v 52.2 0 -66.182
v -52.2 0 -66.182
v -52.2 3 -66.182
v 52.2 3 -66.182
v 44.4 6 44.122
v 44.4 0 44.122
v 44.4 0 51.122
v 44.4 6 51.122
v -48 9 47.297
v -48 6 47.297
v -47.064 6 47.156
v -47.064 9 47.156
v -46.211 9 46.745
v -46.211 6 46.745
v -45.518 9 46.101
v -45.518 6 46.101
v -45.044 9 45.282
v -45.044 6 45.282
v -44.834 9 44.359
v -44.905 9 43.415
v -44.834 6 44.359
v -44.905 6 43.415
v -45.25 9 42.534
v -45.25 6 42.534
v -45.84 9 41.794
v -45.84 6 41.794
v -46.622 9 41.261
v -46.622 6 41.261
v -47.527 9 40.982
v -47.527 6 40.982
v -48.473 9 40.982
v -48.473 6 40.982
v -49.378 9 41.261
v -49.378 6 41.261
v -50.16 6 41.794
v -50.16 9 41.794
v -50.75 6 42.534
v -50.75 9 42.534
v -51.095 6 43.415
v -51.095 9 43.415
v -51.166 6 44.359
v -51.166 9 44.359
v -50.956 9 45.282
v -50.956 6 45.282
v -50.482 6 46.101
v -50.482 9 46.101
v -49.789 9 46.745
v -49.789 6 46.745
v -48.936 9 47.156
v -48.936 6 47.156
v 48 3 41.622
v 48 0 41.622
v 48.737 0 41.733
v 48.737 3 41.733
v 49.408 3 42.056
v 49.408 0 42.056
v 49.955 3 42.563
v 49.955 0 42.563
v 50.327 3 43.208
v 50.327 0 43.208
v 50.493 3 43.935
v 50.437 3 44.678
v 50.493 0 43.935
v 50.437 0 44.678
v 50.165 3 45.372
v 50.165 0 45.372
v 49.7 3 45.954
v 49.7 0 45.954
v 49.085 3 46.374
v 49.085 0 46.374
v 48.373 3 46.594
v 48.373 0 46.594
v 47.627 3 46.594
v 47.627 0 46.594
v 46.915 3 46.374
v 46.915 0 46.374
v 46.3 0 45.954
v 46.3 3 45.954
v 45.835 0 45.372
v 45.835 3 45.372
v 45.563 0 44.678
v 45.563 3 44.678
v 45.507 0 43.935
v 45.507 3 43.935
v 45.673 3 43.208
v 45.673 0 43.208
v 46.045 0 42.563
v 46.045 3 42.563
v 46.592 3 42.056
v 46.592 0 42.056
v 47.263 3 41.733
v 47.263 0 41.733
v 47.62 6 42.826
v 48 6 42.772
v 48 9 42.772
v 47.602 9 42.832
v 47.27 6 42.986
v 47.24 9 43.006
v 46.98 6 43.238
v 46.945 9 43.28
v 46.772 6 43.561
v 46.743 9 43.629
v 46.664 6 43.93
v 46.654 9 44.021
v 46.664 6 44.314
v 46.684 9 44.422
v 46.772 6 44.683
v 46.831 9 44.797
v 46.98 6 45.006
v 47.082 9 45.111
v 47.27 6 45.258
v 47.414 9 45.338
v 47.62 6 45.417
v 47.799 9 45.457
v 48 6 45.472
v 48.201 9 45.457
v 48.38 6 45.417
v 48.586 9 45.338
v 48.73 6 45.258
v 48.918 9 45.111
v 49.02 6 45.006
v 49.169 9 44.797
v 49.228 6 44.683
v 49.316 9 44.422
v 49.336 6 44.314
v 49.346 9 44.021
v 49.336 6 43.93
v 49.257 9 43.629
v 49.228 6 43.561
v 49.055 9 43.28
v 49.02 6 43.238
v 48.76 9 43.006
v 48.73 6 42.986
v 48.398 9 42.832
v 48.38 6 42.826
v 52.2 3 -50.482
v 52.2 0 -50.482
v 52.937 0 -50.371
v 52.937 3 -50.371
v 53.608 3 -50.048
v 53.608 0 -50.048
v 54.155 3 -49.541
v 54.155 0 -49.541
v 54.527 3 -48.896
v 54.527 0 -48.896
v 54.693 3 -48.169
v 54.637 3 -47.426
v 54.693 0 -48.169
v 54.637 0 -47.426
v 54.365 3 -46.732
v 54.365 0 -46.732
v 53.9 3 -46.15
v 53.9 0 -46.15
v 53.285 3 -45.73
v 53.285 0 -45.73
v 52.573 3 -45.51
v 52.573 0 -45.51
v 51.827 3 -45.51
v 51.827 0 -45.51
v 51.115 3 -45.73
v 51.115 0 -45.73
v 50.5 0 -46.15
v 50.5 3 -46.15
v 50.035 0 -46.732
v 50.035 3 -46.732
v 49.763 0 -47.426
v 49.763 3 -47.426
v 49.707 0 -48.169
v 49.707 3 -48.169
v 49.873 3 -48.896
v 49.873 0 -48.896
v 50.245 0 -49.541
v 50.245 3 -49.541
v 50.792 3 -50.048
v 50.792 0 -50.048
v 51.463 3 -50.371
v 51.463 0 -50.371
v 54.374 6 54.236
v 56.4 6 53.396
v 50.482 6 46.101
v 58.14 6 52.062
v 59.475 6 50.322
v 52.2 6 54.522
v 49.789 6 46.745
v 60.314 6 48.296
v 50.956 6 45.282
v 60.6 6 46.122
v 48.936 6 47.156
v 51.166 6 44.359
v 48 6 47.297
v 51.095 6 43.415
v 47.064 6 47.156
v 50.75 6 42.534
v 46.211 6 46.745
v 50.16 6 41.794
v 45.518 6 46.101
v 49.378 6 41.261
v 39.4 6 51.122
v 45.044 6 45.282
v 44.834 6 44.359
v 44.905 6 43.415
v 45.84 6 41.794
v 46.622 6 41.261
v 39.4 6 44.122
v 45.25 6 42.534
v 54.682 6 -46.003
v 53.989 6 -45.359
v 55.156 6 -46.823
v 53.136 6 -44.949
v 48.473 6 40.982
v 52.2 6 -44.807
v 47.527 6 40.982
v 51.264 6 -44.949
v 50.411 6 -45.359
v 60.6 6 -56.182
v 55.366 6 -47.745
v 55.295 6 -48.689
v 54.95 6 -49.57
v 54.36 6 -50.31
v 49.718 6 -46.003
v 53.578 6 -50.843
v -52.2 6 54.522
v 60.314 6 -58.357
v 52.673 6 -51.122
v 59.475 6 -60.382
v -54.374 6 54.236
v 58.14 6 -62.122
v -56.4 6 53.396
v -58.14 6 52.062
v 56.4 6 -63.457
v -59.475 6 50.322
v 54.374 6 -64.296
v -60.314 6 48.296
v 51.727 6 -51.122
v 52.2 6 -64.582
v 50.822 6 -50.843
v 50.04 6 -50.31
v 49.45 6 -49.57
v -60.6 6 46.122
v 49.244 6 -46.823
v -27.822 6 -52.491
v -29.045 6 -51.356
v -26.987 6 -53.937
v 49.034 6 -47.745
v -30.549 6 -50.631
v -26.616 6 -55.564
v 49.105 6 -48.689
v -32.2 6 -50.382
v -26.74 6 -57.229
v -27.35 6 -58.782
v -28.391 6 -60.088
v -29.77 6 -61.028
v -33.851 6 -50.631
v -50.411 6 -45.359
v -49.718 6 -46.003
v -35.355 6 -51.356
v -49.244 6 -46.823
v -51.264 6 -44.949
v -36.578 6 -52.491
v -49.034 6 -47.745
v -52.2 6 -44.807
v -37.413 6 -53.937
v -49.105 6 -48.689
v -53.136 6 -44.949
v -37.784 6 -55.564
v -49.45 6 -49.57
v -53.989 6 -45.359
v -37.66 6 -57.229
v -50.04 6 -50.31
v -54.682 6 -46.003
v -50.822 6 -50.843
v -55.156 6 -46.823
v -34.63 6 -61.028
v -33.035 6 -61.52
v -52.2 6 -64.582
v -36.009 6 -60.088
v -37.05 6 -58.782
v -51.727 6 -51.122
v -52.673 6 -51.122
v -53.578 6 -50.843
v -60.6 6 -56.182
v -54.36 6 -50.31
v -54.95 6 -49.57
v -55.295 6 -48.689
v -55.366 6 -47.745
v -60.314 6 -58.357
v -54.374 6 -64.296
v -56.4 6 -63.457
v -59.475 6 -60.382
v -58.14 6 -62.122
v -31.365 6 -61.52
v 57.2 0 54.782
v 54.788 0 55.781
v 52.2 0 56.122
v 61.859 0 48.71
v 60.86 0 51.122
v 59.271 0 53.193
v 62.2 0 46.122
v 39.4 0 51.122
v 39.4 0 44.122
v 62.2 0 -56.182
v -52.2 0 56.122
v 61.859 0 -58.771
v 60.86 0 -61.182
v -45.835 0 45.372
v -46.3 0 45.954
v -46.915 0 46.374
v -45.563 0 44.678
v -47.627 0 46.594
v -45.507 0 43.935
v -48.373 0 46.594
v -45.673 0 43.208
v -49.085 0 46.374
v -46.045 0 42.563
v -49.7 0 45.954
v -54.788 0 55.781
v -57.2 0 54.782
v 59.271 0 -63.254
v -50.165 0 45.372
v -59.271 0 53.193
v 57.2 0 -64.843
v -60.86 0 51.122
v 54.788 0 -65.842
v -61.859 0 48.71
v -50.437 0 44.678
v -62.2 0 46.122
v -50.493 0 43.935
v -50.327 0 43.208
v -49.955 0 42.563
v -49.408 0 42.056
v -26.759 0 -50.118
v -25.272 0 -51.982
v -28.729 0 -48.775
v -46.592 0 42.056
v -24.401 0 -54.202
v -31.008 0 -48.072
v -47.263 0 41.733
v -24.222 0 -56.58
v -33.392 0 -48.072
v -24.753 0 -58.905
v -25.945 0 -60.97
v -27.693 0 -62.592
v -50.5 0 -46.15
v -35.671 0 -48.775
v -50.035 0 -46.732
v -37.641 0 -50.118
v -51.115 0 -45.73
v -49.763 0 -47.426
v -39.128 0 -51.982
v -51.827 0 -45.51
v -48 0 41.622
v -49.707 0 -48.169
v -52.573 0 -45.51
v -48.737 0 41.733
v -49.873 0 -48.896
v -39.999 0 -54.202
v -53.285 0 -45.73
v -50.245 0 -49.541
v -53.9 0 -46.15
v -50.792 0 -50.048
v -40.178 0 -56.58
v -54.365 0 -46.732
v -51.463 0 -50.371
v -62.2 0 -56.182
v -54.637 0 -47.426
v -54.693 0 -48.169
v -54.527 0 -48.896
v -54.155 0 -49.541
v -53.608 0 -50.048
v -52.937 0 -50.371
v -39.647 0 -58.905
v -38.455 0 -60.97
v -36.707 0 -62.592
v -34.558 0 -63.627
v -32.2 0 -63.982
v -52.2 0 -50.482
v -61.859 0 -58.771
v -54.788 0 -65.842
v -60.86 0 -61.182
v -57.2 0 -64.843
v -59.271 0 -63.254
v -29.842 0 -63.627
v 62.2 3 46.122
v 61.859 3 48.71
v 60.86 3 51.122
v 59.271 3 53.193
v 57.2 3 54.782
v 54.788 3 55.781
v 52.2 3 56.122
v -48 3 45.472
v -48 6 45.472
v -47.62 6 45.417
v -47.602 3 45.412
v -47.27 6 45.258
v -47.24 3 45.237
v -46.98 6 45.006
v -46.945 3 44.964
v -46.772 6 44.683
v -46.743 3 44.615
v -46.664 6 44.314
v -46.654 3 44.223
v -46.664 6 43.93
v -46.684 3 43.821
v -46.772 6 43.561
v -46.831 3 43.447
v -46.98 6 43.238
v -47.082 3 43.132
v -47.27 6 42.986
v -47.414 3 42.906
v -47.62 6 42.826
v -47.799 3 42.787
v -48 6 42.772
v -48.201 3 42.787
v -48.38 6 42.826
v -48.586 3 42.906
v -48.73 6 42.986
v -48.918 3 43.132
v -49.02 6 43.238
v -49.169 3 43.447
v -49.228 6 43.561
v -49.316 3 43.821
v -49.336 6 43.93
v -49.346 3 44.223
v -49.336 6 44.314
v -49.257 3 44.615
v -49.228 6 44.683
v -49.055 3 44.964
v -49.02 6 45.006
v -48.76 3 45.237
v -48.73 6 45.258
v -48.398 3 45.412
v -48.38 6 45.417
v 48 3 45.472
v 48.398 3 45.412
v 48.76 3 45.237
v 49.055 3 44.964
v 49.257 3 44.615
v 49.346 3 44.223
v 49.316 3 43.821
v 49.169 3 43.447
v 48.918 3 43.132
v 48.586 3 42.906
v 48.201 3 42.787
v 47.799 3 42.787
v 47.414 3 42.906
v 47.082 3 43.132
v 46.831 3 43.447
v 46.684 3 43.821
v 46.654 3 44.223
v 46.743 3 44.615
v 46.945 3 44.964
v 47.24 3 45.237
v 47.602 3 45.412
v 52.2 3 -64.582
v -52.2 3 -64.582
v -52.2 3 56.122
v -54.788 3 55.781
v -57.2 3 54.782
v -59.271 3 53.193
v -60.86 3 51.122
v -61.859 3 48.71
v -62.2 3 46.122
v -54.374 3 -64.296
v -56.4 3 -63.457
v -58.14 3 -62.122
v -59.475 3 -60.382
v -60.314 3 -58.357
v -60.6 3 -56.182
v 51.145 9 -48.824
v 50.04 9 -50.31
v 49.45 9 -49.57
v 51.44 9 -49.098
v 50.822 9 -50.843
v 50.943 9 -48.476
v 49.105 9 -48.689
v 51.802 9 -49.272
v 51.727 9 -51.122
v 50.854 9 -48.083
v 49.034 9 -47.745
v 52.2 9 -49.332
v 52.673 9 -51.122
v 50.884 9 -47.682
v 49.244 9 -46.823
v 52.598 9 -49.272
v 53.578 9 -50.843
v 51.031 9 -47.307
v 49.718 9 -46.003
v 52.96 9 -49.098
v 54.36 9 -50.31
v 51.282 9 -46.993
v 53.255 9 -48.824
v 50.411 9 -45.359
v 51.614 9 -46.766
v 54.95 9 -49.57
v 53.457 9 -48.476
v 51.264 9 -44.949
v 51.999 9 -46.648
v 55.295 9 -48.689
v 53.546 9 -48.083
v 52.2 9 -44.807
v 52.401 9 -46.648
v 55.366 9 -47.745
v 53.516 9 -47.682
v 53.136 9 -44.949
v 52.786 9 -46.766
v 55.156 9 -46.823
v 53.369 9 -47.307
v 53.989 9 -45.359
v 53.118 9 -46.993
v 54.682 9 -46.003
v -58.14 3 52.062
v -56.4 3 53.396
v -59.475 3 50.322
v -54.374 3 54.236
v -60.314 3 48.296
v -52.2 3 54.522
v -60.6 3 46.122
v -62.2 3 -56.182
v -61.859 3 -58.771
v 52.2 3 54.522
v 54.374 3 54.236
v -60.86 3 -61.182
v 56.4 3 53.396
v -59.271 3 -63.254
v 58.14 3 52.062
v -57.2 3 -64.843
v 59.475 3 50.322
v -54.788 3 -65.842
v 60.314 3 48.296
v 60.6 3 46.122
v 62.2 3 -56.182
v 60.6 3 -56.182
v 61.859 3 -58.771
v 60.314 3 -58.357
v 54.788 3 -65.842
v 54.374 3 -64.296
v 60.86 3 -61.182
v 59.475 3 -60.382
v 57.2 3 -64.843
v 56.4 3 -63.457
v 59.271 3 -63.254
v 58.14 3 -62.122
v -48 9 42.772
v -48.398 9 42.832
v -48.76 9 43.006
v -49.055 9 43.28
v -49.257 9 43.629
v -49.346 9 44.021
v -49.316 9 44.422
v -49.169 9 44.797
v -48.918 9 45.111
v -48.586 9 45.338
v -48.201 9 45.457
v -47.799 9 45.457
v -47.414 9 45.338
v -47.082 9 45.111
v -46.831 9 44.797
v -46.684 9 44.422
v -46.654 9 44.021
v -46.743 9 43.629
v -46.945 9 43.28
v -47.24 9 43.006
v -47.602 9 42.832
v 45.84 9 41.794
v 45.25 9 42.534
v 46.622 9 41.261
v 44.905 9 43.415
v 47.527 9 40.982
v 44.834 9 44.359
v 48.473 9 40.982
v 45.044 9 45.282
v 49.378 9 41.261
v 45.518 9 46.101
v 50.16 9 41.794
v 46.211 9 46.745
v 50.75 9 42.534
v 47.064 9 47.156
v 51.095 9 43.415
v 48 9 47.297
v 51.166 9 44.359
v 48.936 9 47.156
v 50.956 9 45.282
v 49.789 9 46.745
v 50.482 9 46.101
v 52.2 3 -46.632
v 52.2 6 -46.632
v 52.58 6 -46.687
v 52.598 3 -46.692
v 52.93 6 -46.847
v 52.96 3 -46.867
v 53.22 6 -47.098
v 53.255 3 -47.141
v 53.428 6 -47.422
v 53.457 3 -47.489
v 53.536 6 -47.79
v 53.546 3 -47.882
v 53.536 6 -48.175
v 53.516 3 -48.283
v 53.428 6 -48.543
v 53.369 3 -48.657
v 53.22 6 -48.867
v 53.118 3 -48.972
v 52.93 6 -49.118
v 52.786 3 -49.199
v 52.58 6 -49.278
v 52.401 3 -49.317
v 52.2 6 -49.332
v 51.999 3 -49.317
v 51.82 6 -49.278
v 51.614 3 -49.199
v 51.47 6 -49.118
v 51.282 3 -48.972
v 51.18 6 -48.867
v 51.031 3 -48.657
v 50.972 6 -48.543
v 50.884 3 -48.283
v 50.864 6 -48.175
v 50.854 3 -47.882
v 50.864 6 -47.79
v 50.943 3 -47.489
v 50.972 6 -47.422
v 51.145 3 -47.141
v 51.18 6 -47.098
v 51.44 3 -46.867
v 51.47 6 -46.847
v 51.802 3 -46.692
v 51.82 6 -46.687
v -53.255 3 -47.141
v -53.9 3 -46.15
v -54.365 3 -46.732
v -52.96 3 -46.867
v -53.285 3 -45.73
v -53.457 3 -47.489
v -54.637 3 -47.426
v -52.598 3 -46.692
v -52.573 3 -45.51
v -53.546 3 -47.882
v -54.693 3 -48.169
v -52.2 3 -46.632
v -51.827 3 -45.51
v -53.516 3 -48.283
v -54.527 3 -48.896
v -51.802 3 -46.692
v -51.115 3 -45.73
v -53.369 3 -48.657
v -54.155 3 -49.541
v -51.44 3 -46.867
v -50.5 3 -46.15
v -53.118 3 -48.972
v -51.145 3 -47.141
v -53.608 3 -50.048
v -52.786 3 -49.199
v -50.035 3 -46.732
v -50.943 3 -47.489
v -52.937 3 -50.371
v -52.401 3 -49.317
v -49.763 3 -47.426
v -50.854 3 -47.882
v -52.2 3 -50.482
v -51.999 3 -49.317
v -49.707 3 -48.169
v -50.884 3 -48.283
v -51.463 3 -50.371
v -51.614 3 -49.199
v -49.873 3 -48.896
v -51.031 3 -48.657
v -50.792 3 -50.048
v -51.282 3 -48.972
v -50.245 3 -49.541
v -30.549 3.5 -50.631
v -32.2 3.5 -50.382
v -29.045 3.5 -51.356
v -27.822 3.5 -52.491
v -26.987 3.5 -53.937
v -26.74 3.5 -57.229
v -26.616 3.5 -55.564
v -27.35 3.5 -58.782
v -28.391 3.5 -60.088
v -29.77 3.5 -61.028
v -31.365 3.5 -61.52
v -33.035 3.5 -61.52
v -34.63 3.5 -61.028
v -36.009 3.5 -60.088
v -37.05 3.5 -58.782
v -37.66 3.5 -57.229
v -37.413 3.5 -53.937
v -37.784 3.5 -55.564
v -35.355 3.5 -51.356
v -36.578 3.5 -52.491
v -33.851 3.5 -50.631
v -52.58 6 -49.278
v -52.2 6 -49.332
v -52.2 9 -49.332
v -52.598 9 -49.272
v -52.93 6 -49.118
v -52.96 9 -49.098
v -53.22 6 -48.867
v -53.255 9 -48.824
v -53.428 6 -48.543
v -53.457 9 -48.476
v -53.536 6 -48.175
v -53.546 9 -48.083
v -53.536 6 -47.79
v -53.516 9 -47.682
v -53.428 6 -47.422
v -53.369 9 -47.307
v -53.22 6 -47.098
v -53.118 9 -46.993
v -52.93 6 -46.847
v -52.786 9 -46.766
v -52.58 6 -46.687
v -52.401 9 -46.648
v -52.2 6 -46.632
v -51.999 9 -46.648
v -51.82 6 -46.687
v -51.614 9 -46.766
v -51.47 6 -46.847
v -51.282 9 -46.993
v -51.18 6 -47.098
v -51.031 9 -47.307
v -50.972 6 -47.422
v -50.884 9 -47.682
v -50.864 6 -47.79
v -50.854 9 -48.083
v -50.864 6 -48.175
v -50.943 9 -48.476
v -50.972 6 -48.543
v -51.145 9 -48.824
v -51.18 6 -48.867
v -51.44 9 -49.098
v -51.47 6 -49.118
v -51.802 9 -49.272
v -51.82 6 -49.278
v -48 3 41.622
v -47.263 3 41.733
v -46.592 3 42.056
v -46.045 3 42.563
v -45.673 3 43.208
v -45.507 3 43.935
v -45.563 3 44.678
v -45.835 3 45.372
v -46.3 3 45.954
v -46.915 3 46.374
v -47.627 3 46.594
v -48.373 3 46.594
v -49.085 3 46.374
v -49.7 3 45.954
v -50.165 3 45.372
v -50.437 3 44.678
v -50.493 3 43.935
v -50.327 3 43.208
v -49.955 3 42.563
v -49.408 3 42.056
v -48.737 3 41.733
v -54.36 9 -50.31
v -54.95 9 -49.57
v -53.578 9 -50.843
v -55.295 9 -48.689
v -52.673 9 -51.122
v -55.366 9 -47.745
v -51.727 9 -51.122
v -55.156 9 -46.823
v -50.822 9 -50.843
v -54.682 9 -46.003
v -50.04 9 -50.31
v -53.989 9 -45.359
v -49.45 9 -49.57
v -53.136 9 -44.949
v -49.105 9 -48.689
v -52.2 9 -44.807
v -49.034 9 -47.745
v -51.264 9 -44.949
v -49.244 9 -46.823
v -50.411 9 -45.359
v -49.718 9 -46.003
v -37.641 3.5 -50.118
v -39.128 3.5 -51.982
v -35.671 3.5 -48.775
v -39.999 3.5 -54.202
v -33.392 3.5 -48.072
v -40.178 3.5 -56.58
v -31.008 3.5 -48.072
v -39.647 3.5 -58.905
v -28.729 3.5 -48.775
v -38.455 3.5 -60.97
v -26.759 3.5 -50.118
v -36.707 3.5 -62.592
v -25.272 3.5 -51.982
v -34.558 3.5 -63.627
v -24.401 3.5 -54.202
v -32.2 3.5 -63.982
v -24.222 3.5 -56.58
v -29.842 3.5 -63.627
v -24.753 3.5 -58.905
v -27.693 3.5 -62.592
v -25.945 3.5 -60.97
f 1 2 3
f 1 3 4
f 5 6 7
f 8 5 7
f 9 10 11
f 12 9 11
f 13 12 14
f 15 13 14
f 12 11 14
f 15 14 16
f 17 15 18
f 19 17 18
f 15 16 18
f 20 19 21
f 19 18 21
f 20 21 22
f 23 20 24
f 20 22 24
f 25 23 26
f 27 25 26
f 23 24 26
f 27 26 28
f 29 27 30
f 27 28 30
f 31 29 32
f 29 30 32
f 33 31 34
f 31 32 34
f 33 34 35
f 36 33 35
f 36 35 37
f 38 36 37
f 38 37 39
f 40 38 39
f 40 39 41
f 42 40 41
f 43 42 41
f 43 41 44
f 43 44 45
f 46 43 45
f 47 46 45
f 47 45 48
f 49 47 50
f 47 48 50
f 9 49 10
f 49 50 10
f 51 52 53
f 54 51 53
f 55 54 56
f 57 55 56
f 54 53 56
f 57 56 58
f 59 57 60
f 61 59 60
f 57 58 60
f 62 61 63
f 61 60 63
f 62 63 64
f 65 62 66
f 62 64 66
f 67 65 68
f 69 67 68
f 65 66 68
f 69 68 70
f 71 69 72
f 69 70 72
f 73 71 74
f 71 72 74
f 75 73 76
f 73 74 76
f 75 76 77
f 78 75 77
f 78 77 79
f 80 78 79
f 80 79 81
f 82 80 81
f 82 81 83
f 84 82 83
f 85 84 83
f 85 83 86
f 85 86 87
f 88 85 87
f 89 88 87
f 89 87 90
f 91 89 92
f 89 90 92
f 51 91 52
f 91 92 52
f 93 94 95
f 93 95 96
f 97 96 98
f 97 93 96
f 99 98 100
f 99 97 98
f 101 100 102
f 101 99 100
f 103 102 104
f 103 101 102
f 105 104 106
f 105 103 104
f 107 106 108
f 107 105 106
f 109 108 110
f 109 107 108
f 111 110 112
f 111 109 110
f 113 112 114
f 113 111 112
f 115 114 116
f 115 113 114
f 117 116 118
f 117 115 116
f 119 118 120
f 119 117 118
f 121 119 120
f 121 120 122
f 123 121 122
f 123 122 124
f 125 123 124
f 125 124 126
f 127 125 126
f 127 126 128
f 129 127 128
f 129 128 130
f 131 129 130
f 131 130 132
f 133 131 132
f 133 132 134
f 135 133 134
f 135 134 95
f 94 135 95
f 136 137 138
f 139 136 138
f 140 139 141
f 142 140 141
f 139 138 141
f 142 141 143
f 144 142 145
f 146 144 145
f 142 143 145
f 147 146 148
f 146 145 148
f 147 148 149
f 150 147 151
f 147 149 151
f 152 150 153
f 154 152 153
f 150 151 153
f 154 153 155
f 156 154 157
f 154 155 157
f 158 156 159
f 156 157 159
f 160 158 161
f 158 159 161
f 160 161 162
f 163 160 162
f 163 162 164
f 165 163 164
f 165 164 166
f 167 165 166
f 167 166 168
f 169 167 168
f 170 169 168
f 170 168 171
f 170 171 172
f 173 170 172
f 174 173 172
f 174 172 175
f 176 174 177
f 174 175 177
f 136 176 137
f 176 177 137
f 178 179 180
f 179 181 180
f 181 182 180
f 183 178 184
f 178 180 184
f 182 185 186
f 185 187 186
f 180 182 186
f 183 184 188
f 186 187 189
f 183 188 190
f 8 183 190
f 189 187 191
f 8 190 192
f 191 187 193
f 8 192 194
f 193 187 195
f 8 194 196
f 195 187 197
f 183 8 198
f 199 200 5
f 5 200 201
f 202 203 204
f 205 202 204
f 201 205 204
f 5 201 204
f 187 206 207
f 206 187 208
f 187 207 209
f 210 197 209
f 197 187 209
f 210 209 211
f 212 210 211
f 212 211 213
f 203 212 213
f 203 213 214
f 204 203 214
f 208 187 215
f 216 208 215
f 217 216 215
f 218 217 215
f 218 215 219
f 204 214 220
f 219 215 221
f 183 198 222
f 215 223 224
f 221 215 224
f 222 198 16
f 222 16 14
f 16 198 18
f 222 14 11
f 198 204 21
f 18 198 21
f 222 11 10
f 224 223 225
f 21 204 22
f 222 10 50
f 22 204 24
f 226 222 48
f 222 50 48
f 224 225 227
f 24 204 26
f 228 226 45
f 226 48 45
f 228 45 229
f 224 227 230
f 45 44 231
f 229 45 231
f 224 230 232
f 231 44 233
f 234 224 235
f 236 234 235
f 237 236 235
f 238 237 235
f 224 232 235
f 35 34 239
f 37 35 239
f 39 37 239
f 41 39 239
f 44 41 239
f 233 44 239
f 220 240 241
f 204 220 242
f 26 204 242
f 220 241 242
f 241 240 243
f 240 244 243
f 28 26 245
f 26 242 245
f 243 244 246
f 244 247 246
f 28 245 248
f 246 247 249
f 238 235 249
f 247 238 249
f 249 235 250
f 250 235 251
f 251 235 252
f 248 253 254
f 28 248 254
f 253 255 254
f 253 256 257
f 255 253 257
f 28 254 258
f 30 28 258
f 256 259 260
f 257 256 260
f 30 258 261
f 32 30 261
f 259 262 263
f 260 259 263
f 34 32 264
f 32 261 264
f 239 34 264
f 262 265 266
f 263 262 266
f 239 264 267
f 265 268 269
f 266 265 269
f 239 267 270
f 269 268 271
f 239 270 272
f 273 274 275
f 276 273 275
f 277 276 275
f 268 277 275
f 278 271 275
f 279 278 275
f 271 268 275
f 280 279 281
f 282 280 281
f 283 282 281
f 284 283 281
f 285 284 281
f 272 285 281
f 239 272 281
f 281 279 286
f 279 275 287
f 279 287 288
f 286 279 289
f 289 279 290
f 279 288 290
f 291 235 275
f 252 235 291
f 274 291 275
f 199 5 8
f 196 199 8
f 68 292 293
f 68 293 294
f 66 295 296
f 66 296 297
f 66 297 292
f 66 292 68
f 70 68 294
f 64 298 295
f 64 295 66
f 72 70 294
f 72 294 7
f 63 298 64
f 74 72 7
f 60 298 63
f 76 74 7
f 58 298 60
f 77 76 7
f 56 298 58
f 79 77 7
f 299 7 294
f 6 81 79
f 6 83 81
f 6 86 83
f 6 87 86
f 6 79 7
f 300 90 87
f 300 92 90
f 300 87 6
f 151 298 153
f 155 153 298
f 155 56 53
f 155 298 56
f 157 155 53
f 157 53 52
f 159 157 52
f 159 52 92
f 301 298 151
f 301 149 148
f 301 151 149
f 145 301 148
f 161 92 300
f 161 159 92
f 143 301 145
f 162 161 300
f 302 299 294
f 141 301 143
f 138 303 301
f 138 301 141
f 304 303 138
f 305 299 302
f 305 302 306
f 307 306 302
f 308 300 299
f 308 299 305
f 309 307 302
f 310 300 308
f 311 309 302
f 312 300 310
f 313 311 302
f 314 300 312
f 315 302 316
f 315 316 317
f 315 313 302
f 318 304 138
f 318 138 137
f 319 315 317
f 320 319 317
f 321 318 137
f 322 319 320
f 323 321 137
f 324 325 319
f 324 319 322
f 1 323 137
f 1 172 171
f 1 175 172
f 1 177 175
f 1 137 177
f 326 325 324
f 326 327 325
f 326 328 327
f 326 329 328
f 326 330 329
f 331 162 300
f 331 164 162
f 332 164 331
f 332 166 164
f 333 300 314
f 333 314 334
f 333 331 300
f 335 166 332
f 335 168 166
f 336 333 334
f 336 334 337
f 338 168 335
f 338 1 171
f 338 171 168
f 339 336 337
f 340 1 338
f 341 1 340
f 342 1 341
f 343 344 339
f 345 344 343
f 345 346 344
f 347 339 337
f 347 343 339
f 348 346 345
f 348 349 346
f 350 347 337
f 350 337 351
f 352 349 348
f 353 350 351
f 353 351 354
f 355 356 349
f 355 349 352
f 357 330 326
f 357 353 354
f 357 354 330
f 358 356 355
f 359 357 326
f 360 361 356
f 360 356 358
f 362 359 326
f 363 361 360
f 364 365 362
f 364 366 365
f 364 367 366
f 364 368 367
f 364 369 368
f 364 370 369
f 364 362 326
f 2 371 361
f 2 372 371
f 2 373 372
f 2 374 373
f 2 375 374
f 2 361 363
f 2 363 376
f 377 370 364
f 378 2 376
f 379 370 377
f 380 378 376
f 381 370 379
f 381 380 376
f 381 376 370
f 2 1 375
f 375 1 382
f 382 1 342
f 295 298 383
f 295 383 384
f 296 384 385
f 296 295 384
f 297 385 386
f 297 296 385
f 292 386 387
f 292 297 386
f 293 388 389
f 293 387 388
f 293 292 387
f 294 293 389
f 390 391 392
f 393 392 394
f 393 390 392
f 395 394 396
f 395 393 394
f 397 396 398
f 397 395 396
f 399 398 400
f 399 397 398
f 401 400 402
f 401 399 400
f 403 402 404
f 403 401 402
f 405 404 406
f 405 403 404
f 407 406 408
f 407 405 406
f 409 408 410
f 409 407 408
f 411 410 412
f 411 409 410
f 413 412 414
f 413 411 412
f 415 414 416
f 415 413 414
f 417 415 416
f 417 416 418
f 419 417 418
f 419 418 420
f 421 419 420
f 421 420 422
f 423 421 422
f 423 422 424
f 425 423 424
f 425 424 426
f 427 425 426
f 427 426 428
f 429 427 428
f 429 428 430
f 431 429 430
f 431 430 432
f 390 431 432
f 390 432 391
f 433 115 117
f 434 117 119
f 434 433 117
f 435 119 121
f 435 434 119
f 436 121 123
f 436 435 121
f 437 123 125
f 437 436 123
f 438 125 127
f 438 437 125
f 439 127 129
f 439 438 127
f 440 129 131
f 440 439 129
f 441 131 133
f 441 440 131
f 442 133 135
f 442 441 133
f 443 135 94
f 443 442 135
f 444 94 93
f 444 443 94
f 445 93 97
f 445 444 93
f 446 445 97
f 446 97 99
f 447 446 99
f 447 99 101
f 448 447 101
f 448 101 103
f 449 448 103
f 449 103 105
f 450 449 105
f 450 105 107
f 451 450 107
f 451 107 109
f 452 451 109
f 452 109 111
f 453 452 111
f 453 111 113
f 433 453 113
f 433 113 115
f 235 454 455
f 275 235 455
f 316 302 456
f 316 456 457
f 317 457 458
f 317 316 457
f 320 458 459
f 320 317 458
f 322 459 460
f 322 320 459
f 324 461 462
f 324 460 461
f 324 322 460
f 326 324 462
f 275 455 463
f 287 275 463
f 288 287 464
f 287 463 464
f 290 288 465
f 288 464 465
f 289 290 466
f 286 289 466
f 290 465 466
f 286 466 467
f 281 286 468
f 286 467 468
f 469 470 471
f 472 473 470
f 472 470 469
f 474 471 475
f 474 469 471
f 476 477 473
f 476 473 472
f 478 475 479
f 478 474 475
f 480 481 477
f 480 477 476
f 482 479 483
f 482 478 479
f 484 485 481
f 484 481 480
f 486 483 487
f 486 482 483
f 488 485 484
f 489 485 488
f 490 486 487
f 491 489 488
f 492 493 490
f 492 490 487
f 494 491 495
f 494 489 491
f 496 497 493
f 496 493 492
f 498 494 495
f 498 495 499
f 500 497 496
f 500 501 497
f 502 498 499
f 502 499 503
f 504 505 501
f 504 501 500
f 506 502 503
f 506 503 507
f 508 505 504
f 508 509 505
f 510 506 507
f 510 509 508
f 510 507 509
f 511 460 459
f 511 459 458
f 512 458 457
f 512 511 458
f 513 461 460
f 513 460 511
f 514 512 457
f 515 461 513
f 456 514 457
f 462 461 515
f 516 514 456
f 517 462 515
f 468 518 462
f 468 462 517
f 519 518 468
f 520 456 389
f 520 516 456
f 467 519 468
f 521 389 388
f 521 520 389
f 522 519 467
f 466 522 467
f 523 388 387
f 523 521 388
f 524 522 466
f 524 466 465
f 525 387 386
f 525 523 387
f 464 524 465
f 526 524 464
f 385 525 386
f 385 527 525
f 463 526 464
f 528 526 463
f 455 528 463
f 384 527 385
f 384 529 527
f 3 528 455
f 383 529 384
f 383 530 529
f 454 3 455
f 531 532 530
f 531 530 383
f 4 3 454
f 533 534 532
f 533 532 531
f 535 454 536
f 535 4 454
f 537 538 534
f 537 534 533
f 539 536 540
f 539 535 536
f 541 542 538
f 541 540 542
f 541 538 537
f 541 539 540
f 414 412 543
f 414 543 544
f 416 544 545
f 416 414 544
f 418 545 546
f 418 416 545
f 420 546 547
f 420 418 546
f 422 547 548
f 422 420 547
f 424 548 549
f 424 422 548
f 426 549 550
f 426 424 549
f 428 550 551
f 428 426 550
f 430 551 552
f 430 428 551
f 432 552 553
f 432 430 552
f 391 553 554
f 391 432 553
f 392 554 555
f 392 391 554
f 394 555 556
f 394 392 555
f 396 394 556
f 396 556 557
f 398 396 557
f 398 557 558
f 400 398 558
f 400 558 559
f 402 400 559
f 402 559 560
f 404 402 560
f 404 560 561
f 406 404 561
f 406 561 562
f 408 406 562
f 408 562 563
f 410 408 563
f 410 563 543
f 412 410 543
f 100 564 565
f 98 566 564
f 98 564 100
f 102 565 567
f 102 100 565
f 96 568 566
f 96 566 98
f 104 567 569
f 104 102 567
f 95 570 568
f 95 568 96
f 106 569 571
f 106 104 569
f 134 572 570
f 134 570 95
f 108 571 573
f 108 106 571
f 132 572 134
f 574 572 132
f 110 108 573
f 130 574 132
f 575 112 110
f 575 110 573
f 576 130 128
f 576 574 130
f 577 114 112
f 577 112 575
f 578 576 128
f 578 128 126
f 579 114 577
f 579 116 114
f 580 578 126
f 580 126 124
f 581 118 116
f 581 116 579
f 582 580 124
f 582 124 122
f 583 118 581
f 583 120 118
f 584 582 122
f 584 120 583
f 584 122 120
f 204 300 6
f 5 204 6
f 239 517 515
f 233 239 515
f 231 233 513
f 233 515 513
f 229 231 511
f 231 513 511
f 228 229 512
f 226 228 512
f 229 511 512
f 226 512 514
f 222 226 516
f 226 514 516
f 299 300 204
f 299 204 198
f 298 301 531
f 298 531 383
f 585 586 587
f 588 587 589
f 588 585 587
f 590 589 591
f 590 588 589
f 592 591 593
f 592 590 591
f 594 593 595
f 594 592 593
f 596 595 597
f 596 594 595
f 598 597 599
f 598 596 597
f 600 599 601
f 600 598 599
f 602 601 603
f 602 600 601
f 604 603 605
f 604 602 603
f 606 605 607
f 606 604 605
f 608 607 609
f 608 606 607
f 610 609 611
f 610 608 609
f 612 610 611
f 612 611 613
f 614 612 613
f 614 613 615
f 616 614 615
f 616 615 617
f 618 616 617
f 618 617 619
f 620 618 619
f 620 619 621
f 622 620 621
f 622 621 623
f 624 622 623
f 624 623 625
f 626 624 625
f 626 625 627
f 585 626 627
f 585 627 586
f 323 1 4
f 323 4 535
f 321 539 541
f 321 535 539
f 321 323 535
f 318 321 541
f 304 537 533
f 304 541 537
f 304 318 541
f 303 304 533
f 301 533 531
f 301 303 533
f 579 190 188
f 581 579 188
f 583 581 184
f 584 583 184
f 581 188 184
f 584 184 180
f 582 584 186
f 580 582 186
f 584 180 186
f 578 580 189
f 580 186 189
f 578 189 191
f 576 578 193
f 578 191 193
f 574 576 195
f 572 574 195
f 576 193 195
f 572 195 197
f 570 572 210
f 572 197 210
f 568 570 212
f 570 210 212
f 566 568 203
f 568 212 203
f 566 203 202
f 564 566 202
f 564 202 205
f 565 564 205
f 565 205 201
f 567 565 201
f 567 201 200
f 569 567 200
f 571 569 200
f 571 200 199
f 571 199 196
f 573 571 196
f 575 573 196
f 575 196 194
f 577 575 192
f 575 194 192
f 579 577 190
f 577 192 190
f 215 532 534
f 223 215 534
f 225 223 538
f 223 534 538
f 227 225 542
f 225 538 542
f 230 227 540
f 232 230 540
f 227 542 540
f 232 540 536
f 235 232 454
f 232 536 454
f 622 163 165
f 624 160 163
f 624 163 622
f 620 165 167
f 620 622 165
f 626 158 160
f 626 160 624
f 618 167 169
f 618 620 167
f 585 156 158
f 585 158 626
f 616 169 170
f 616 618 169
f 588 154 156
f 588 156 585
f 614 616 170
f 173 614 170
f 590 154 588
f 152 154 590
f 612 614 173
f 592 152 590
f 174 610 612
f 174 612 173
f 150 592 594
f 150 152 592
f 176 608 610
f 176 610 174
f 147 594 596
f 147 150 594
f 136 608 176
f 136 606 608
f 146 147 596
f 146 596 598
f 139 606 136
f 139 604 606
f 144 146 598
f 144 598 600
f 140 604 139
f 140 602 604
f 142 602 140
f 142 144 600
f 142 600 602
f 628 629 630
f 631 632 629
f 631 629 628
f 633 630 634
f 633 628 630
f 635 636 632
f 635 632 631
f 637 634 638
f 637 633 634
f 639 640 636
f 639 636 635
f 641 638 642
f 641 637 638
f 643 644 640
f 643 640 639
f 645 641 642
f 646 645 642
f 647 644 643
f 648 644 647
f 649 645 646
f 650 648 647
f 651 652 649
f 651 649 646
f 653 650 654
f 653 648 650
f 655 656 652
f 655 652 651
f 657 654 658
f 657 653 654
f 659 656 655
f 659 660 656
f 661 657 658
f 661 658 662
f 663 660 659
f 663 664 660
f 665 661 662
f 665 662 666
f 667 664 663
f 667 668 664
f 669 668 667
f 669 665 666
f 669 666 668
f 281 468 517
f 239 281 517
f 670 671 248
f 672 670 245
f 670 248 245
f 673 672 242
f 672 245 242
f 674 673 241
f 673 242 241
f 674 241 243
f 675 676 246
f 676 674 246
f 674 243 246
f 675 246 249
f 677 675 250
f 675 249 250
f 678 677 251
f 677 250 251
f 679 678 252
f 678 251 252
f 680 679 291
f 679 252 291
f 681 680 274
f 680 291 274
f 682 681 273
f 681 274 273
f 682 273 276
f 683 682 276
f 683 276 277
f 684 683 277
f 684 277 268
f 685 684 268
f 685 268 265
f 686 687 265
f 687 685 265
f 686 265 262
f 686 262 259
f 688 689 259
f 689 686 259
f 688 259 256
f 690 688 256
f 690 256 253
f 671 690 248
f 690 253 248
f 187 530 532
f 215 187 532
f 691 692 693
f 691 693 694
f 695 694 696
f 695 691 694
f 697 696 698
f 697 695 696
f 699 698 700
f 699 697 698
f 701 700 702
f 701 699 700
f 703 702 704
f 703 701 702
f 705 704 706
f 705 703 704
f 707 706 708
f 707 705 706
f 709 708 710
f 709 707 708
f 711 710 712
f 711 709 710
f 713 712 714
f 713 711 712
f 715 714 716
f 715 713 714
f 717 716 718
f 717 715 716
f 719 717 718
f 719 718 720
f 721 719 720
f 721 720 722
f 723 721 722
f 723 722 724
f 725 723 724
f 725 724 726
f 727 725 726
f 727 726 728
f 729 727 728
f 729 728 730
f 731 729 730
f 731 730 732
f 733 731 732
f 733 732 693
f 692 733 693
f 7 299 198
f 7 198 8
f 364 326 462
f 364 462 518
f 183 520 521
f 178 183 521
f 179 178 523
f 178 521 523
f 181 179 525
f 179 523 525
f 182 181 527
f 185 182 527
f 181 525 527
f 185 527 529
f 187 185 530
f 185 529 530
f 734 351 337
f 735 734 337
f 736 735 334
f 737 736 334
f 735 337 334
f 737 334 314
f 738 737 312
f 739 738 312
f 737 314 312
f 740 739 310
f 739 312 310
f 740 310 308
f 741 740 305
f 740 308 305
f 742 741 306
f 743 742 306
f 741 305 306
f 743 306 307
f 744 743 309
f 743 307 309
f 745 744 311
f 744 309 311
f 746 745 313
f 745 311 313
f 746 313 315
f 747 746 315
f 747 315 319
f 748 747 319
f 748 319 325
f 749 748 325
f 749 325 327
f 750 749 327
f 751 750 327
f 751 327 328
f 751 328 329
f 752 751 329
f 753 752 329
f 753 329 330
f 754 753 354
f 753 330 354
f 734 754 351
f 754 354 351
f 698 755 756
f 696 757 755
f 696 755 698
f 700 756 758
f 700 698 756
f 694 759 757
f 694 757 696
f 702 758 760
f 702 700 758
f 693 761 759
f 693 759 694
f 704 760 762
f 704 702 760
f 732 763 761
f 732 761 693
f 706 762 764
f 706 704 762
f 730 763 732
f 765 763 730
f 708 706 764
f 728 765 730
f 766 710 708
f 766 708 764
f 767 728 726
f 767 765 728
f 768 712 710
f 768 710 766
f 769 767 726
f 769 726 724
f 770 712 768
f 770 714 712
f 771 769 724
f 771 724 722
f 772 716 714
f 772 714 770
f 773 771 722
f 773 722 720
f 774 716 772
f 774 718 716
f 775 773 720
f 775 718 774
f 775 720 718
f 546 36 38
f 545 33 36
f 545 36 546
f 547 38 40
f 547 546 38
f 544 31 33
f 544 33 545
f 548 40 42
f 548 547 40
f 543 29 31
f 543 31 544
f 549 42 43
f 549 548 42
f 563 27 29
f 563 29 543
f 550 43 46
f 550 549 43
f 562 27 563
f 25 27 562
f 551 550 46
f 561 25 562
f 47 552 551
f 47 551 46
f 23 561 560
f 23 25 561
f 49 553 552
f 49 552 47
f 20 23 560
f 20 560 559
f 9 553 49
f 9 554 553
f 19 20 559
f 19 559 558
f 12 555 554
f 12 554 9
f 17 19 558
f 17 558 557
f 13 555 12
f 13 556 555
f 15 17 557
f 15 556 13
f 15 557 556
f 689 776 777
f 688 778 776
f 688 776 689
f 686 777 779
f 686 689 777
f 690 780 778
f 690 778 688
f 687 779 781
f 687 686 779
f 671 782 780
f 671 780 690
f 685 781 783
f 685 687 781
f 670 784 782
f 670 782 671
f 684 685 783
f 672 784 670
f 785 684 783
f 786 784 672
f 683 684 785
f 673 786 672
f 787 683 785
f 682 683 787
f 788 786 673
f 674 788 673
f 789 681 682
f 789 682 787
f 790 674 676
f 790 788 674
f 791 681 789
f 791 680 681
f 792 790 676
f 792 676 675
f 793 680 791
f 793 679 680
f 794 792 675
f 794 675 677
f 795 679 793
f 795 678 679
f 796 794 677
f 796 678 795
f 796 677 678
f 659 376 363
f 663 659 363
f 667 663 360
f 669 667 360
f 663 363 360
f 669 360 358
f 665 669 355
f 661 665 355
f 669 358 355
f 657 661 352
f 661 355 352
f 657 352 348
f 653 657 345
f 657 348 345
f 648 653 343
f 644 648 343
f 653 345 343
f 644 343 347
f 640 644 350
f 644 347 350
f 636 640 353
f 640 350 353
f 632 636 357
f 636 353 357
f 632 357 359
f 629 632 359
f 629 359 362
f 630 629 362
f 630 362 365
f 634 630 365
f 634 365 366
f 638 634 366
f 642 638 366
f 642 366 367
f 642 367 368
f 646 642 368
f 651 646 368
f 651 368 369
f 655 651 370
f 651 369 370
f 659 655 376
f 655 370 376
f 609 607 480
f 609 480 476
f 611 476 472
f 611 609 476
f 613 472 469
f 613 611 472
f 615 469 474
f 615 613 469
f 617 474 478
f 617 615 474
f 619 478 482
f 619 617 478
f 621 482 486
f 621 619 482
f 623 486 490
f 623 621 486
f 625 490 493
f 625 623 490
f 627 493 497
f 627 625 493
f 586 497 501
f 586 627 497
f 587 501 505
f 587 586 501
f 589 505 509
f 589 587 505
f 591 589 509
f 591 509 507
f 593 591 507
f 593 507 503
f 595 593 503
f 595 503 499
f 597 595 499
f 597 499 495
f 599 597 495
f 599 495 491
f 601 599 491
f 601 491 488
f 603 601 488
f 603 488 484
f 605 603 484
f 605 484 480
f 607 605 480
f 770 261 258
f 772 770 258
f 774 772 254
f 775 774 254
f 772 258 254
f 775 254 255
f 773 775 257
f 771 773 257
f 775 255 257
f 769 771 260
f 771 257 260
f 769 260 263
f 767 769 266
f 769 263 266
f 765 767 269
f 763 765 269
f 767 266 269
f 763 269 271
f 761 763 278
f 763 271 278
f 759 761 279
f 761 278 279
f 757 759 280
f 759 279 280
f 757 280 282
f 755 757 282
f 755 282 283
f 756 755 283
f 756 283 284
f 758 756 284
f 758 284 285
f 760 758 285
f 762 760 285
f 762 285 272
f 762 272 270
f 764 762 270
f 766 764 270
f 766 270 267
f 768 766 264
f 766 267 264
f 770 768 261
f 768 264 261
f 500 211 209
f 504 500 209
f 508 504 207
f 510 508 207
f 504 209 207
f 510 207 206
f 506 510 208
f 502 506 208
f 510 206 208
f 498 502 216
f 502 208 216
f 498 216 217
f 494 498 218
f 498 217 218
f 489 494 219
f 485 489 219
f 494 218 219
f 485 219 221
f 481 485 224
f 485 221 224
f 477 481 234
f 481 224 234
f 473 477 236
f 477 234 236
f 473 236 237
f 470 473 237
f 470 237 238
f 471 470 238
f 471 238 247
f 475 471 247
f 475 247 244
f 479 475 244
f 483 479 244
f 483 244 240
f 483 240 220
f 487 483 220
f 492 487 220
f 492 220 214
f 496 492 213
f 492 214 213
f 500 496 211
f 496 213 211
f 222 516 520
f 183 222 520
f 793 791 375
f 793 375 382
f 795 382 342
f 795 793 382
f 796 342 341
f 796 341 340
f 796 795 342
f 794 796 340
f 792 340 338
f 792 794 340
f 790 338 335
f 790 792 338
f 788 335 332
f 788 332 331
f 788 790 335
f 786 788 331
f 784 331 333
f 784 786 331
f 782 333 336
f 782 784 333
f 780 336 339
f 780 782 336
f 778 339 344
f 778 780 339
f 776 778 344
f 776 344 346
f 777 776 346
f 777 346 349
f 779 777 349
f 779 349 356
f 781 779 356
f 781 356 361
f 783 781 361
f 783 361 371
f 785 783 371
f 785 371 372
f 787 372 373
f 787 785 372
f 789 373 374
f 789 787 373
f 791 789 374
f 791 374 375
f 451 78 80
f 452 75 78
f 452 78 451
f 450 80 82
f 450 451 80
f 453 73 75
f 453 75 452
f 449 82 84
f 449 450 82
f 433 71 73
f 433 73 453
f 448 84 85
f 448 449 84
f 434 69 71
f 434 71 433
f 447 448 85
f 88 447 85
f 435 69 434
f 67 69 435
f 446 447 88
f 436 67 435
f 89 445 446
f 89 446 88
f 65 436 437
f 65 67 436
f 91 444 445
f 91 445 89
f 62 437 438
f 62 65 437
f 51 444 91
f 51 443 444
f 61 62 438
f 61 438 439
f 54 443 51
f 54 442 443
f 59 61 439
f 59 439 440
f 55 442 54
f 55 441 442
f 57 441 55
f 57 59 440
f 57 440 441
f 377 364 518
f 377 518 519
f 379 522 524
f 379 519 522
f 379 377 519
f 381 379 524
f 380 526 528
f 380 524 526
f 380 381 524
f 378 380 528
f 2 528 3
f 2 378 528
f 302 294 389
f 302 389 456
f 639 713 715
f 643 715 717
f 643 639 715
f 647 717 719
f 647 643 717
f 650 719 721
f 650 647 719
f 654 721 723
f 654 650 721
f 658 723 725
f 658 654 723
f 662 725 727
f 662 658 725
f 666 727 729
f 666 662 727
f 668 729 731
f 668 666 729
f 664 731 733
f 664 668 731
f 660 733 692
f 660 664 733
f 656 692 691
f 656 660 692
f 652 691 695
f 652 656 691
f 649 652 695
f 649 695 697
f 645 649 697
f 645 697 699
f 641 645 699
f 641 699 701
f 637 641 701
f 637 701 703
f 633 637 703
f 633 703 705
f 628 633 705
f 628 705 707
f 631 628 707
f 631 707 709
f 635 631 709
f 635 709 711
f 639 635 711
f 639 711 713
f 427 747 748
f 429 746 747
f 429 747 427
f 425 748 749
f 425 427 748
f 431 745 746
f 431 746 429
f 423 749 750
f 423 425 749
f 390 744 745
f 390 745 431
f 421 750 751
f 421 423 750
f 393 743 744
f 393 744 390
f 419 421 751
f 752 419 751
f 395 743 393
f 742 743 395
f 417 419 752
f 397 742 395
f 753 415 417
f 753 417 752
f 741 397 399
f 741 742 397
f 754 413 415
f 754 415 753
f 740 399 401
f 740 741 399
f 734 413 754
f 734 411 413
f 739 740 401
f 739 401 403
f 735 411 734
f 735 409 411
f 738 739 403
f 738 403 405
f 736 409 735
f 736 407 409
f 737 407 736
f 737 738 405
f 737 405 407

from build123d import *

# Parameters (mm, degrees)
SKETCH1_R           = 1.35
BOSS_EXTRUDE1_DEPTH = 6
SKETCH2_R           = 2.5
SKETCH2_R_2         = 1.35
CUT_EXTRUDE1_DEPTH  = 3
SKETCH3_R           = 3.175
SKETCH3_R_2         = 1.35
BOSS_EXTRUDE2_DEPTH = 3
CUT_EXTRUDE2_START  = -3
CUT_EXTRUDE2_DEPTH  = 3
SKETCH7_R           = 5.6
CUT_EXTRUDE3_DEPTH  = 10
CUT_EXTRUDE4_START  = -3.5
SKETCH8_R           = 8
SKETCH8_R_2         = 5.6
CUT_EXTRUDE4_DEPTH  = 3.5
SKETCH9_W           = 5
SKETCH9_H           = 7
CUT_EXTRUDE5_DEPTH  = 92.268613627


with BuildPart() as part:
    # Sketch1 → Boss-Extrude1 (new body)
    with BuildSketch(Plane(origin=(0, 0, 0), x_dir=(1, 0, 0), z_dir=(0, 1, 0))):
        with BuildLine():
            Line((-52.2, 66.182473763), (52.2, 66.182473763))
            ThreePointArc((52.2, 66.182473763), (59.271067812, 63.253541574), (62.2, 56.182473763))
            Line((62.2, 56.182473763), (62.2, -46.121814954))
            ThreePointArc((62.2, -46.121814954), (59.271067812, -53.192882766), (52.2, -56.121814954))
            Line((52.2, -56.121814954), (-52.2, -56.121814954))
            ThreePointArc((-52.2, -56.121814954), (-59.271067812, -53.192882766), (-62.2, -46.121814954))
            Line((-62.2, -46.121814954), (-62.2, 56.182473763))
            ThreePointArc((-62.2, 56.182473763), (-59.271067812, 63.253541574), (-52.2, 66.182473763))
        make_face()
        with Locations(Location((-48, -44.121814954, 0), (0, 0, 270))):
            Circle(SKETCH1_R, mode=Mode.SUBTRACT)
        with Locations(Location((-52.2, 47.982473763, 0), (0, 0, 270))):
            Circle(SKETCH1_R, mode=Mode.SUBTRACT)
        with Locations(Location((52.2, 47.982473763, 0), (0, 0, 270))):
            Circle(SKETCH1_R, mode=Mode.SUBTRACT)
        with Locations(Location((48, -44.121814954, 0), (0, 0, 270))):
            Circle(SKETCH1_R, mode=Mode.SUBTRACT)
    extrude(amount=BOSS_EXTRUDE1_DEPTH)

    # Sketch2 → Cut-Extrude1 (cut)
    # profile 1 of 4: a face of its own
    with BuildSketch(Plane.XZ):
        with Locations(Location((-48, 44.121814954, 0), (0, 0, 270))):
            Circle(SKETCH2_R)
        with Locations(Location((-48, 44.121814954, 0), (0, 0, 270))):
            Circle(SKETCH2_R_2, mode=Mode.SUBTRACT)
    # profile 2 of 4: a face of its own
    with BuildSketch(Plane.XZ):
        with Locations(Location((-52.2, -47.982473763, 0), (0, 0, 270))):
            Circle(SKETCH2_R)
        with Locations(Location((-52.2, -47.982473763, 0), (0, 0, 270))):
            Circle(SKETCH2_R_2, mode=Mode.SUBTRACT)
    # profile 3 of 4: a face of its own
    with BuildSketch(Plane.XZ):
        with Locations(Location((52.2, -47.982473763, 0), (0, 0, 270))):
            Circle(SKETCH2_R)
        with Locations(Location((52.2, -47.982473763, 0), (0, 0, 270))):
            Circle(SKETCH2_R_2, mode=Mode.SUBTRACT)
    # profile 4 of 4: a face of its own
    with BuildSketch(Plane.XZ):
        with Locations(Location((48, 44.121814954, 0), (0, 0, 270))):
            Circle(SKETCH2_R)
        with Locations(Location((48, 44.121814954, 0), (0, 0, 270))):
            Circle(SKETCH2_R_2, mode=Mode.SUBTRACT)
    extrude(amount=-CUT_EXTRUDE1_DEPTH, mode=Mode.SUBTRACT)

    # Sketch3 → Boss-Extrude2 (add)
    # profile 1 of 4: a face of its own
    with BuildSketch(Plane(origin=(0, 6, 0), x_dir=(1, 0, 0), z_dir=(0, 1, 0))):
        with Locations(Location((-52.2, 47.982473763, 0), (0, 0, 270))):
            Circle(SKETCH3_R)
        with Locations(Location((-52.2, 47.982473763, 0), (0, 0, 90))):
            Circle(SKETCH3_R_2, mode=Mode.SUBTRACT)
    # profile 2 of 4: a face of its own
    with BuildSketch(Plane(origin=(0, 6, 0), x_dir=(1, 0, 0), z_dir=(0, 1, 0))):
        with Locations(Location((52.2, 47.982473763, 0), (0, 0, 270))):
            Circle(SKETCH3_R)
        with Locations(Location((52.2, 47.982473763, 0), (0, 0, 90))):
            Circle(SKETCH3_R_2, mode=Mode.SUBTRACT)
    # profile 3 of 4: a face of its own
    with BuildSketch(Plane(origin=(0, 6, 0), x_dir=(1, 0, 0), z_dir=(0, 1, 0))):
        with Locations(Location((48, -44.121814954, 0), (0, 0, 270))):
            Circle(SKETCH3_R)
        with Locations(Location((48, -44.121814954, 0), (0, 0, 90))):
            Circle(SKETCH3_R_2, mode=Mode.SUBTRACT)
    # profile 4 of 4: a face of its own
    with BuildSketch(Plane(origin=(0, 6, 0), x_dir=(1, 0, 0), z_dir=(0, 1, 0))):
        with Locations(Location((-48, -44.121814954, 0), (0, 0, 270))):
            Circle(SKETCH3_R)
        with Locations(Location((-48, -44.121814954, 0), (0, 0, 90))):
            Circle(SKETCH3_R_2, mode=Mode.SUBTRACT)
    extrude(amount=BOSS_EXTRUDE2_DEPTH)

    # Sketch4 → Cut-Extrude2 (cut)
    with BuildSketch(Plane(origin=(0, 6, 0), x_dir=(1, 0, 0), z_dir=(0, 1, 0)).offset(CUT_EXTRUDE2_START)):
        with BuildLine():
            Line((52.2, 66.182473763), (-52.2, 66.182473763))
            ThreePointArc((-52.2, 66.182473763), (-59.271067812, 63.253541574), (-62.2, 56.182473763))
            Line((-62.2, 56.182473763), (-62.2, -46.121814954))
            ThreePointArc((-62.2, -46.121814954), (-59.271067812, -53.192882766), (-52.2, -56.121814954))
            Line((-52.2, -56.121814954), (52.2, -56.121814954))
            ThreePointArc((52.2, -56.121814954), (59.271067812, -53.192882766), (62.2, -46.121814954))
            Line((62.2, -46.121814954), (62.2, 56.182473763))
            ThreePointArc((62.2, 56.182473763), (59.271067812, 63.253541574), (52.2, 66.182473763))
        make_face()
        with BuildLine():
            Line((-60.6, 56.182473763), (-60.6, -46.121814954))
            ThreePointArc((-60.6, -46.121814954), (-58.139696962, -52.061511916), (-52.2, -54.521814954))
            Line((-52.2, -54.521814954), (52.2, -54.521814954))
            ThreePointArc((52.2, -54.521814954), (58.139696962, -52.061511916), (60.6, -46.121814954))
            Line((60.6, -46.121814954), (60.6, 56.182473763))
            ThreePointArc((60.6, 56.182473763), (58.139696962, 62.122170725), (52.2, 64.582473763))
            Line((52.2, 64.582473763), (-52.2, 64.582473763))
            ThreePointArc((-52.2, 64.582473763), (-58.139696962, 62.122170725), (-60.6, 56.182473763))
        make_face(mode=Mode.SUBTRACT)
    extrude(amount=CUT_EXTRUDE2_DEPTH, mode=Mode.SUBTRACT)

    # Sketch7 → Cut-Extrude3 (cut)
    with BuildSketch(Plane(origin=(0, 6, 0), x_dir=(1, 0, 0), z_dir=(0, 1, 0))):
        with Locations(Location((-32.2, 55.982473763, 0), (0, 0, 270))):
            Circle(SKETCH7_R)
    extrude(amount=-CUT_EXTRUDE3_DEPTH, mode=Mode.SUBTRACT)

    # Sketch8 → Cut-Extrude4 (cut)
    with BuildSketch(Plane.XZ.offset(CUT_EXTRUDE4_START)):
        with Locations(Location((-32.2, -55.982473763, 0), (0, 0, 270))):
            Circle(SKETCH8_R)
        with Locations(Location((-32.2, -55.982473763, 0), (0, 0, 90))):
            Circle(SKETCH8_R_2, mode=Mode.SUBTRACT)
    extrude(amount=CUT_EXTRUDE4_DEPTH, mode=Mode.SUBTRACT)

    # Sketch9 → Cut-Extrude5 (cut, through all)
    with BuildSketch(Plane.XZ):
        with Locations((41.9, 47.621814954)):
            Rectangle(SKETCH9_W, SKETCH9_H)
    extrude(amount=-CUT_EXTRUDE5_DEPTH, mode=Mode.SUBTRACT)


solid = part.part
